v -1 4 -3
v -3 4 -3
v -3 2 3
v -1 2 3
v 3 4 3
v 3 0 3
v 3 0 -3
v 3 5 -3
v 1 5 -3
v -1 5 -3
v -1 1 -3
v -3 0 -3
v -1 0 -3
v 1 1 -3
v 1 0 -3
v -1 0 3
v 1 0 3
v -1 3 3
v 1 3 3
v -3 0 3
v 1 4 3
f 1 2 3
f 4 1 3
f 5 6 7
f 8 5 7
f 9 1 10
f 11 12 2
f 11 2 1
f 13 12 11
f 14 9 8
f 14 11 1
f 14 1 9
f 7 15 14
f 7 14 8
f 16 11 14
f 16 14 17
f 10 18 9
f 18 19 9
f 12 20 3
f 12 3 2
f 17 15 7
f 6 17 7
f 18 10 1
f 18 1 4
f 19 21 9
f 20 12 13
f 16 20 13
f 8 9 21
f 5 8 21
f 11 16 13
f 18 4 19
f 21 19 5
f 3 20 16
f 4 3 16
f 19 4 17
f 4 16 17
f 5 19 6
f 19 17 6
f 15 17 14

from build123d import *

# Parameters (mm, degrees)
SKETCH1_W           = 6
SKETCH1_H           = 6
BOSS_EXTRUDE1_DEPTH = 5
CUT_EXTRUDE1_DEPTH  = 1
CUT_EXTRUDE2_DEPTH  = 2
CUT_EXTRUDE3_DEPTH  = 2


with BuildPart() as part:
    # Sketch1 → Boss-Extrude1 (new body)
    with BuildSketch(Plane(origin=(0, 0, 0), x_dir=(1, 0, 0), z_dir=(0, 1, 0))):
        Rectangle(SKETCH1_W, SKETCH1_H)
    extrude(amount=BOSS_EXTRUDE1_DEPTH)

    # Sketch2 → Cut-Extrude1 (cut, symmetric)
    with BuildSketch(Plane(origin=(0, 0, 0), x_dir=(0, 0, -1), z_dir=(1, 0, 0))):
        Polygon((-3, 0), (3, 0), (3, 1), align=None)
        Polygon((3, 5), (-3, 5), (-3, 3), align=None)
    extrude(amount=CUT_EXTRUDE1_DEPTH, both=True, mode=Mode.SUBTRACT)

    # Sketch3 → Cut-Extrude2 (cut)
    with BuildSketch(Plane.ZY.offset(3)):
        Polygon((-3, 4), (3, 2), (3, 5), (-3, 5), align=None)
    extrude(amount=-CUT_EXTRUDE2_DEPTH, mode=Mode.SUBTRACT)

    # Sketch4 → Cut-Extrude3 (cut)
    with BuildSketch(Plane.ZY.offset(-1)):
        Polygon((3, 5), (-3, 5), (3, 4), align=None)
    extrude(amount=-CUT_EXTRUDE3_DEPTH, mode=Mode.SUBTRACT)


solid = part.part
